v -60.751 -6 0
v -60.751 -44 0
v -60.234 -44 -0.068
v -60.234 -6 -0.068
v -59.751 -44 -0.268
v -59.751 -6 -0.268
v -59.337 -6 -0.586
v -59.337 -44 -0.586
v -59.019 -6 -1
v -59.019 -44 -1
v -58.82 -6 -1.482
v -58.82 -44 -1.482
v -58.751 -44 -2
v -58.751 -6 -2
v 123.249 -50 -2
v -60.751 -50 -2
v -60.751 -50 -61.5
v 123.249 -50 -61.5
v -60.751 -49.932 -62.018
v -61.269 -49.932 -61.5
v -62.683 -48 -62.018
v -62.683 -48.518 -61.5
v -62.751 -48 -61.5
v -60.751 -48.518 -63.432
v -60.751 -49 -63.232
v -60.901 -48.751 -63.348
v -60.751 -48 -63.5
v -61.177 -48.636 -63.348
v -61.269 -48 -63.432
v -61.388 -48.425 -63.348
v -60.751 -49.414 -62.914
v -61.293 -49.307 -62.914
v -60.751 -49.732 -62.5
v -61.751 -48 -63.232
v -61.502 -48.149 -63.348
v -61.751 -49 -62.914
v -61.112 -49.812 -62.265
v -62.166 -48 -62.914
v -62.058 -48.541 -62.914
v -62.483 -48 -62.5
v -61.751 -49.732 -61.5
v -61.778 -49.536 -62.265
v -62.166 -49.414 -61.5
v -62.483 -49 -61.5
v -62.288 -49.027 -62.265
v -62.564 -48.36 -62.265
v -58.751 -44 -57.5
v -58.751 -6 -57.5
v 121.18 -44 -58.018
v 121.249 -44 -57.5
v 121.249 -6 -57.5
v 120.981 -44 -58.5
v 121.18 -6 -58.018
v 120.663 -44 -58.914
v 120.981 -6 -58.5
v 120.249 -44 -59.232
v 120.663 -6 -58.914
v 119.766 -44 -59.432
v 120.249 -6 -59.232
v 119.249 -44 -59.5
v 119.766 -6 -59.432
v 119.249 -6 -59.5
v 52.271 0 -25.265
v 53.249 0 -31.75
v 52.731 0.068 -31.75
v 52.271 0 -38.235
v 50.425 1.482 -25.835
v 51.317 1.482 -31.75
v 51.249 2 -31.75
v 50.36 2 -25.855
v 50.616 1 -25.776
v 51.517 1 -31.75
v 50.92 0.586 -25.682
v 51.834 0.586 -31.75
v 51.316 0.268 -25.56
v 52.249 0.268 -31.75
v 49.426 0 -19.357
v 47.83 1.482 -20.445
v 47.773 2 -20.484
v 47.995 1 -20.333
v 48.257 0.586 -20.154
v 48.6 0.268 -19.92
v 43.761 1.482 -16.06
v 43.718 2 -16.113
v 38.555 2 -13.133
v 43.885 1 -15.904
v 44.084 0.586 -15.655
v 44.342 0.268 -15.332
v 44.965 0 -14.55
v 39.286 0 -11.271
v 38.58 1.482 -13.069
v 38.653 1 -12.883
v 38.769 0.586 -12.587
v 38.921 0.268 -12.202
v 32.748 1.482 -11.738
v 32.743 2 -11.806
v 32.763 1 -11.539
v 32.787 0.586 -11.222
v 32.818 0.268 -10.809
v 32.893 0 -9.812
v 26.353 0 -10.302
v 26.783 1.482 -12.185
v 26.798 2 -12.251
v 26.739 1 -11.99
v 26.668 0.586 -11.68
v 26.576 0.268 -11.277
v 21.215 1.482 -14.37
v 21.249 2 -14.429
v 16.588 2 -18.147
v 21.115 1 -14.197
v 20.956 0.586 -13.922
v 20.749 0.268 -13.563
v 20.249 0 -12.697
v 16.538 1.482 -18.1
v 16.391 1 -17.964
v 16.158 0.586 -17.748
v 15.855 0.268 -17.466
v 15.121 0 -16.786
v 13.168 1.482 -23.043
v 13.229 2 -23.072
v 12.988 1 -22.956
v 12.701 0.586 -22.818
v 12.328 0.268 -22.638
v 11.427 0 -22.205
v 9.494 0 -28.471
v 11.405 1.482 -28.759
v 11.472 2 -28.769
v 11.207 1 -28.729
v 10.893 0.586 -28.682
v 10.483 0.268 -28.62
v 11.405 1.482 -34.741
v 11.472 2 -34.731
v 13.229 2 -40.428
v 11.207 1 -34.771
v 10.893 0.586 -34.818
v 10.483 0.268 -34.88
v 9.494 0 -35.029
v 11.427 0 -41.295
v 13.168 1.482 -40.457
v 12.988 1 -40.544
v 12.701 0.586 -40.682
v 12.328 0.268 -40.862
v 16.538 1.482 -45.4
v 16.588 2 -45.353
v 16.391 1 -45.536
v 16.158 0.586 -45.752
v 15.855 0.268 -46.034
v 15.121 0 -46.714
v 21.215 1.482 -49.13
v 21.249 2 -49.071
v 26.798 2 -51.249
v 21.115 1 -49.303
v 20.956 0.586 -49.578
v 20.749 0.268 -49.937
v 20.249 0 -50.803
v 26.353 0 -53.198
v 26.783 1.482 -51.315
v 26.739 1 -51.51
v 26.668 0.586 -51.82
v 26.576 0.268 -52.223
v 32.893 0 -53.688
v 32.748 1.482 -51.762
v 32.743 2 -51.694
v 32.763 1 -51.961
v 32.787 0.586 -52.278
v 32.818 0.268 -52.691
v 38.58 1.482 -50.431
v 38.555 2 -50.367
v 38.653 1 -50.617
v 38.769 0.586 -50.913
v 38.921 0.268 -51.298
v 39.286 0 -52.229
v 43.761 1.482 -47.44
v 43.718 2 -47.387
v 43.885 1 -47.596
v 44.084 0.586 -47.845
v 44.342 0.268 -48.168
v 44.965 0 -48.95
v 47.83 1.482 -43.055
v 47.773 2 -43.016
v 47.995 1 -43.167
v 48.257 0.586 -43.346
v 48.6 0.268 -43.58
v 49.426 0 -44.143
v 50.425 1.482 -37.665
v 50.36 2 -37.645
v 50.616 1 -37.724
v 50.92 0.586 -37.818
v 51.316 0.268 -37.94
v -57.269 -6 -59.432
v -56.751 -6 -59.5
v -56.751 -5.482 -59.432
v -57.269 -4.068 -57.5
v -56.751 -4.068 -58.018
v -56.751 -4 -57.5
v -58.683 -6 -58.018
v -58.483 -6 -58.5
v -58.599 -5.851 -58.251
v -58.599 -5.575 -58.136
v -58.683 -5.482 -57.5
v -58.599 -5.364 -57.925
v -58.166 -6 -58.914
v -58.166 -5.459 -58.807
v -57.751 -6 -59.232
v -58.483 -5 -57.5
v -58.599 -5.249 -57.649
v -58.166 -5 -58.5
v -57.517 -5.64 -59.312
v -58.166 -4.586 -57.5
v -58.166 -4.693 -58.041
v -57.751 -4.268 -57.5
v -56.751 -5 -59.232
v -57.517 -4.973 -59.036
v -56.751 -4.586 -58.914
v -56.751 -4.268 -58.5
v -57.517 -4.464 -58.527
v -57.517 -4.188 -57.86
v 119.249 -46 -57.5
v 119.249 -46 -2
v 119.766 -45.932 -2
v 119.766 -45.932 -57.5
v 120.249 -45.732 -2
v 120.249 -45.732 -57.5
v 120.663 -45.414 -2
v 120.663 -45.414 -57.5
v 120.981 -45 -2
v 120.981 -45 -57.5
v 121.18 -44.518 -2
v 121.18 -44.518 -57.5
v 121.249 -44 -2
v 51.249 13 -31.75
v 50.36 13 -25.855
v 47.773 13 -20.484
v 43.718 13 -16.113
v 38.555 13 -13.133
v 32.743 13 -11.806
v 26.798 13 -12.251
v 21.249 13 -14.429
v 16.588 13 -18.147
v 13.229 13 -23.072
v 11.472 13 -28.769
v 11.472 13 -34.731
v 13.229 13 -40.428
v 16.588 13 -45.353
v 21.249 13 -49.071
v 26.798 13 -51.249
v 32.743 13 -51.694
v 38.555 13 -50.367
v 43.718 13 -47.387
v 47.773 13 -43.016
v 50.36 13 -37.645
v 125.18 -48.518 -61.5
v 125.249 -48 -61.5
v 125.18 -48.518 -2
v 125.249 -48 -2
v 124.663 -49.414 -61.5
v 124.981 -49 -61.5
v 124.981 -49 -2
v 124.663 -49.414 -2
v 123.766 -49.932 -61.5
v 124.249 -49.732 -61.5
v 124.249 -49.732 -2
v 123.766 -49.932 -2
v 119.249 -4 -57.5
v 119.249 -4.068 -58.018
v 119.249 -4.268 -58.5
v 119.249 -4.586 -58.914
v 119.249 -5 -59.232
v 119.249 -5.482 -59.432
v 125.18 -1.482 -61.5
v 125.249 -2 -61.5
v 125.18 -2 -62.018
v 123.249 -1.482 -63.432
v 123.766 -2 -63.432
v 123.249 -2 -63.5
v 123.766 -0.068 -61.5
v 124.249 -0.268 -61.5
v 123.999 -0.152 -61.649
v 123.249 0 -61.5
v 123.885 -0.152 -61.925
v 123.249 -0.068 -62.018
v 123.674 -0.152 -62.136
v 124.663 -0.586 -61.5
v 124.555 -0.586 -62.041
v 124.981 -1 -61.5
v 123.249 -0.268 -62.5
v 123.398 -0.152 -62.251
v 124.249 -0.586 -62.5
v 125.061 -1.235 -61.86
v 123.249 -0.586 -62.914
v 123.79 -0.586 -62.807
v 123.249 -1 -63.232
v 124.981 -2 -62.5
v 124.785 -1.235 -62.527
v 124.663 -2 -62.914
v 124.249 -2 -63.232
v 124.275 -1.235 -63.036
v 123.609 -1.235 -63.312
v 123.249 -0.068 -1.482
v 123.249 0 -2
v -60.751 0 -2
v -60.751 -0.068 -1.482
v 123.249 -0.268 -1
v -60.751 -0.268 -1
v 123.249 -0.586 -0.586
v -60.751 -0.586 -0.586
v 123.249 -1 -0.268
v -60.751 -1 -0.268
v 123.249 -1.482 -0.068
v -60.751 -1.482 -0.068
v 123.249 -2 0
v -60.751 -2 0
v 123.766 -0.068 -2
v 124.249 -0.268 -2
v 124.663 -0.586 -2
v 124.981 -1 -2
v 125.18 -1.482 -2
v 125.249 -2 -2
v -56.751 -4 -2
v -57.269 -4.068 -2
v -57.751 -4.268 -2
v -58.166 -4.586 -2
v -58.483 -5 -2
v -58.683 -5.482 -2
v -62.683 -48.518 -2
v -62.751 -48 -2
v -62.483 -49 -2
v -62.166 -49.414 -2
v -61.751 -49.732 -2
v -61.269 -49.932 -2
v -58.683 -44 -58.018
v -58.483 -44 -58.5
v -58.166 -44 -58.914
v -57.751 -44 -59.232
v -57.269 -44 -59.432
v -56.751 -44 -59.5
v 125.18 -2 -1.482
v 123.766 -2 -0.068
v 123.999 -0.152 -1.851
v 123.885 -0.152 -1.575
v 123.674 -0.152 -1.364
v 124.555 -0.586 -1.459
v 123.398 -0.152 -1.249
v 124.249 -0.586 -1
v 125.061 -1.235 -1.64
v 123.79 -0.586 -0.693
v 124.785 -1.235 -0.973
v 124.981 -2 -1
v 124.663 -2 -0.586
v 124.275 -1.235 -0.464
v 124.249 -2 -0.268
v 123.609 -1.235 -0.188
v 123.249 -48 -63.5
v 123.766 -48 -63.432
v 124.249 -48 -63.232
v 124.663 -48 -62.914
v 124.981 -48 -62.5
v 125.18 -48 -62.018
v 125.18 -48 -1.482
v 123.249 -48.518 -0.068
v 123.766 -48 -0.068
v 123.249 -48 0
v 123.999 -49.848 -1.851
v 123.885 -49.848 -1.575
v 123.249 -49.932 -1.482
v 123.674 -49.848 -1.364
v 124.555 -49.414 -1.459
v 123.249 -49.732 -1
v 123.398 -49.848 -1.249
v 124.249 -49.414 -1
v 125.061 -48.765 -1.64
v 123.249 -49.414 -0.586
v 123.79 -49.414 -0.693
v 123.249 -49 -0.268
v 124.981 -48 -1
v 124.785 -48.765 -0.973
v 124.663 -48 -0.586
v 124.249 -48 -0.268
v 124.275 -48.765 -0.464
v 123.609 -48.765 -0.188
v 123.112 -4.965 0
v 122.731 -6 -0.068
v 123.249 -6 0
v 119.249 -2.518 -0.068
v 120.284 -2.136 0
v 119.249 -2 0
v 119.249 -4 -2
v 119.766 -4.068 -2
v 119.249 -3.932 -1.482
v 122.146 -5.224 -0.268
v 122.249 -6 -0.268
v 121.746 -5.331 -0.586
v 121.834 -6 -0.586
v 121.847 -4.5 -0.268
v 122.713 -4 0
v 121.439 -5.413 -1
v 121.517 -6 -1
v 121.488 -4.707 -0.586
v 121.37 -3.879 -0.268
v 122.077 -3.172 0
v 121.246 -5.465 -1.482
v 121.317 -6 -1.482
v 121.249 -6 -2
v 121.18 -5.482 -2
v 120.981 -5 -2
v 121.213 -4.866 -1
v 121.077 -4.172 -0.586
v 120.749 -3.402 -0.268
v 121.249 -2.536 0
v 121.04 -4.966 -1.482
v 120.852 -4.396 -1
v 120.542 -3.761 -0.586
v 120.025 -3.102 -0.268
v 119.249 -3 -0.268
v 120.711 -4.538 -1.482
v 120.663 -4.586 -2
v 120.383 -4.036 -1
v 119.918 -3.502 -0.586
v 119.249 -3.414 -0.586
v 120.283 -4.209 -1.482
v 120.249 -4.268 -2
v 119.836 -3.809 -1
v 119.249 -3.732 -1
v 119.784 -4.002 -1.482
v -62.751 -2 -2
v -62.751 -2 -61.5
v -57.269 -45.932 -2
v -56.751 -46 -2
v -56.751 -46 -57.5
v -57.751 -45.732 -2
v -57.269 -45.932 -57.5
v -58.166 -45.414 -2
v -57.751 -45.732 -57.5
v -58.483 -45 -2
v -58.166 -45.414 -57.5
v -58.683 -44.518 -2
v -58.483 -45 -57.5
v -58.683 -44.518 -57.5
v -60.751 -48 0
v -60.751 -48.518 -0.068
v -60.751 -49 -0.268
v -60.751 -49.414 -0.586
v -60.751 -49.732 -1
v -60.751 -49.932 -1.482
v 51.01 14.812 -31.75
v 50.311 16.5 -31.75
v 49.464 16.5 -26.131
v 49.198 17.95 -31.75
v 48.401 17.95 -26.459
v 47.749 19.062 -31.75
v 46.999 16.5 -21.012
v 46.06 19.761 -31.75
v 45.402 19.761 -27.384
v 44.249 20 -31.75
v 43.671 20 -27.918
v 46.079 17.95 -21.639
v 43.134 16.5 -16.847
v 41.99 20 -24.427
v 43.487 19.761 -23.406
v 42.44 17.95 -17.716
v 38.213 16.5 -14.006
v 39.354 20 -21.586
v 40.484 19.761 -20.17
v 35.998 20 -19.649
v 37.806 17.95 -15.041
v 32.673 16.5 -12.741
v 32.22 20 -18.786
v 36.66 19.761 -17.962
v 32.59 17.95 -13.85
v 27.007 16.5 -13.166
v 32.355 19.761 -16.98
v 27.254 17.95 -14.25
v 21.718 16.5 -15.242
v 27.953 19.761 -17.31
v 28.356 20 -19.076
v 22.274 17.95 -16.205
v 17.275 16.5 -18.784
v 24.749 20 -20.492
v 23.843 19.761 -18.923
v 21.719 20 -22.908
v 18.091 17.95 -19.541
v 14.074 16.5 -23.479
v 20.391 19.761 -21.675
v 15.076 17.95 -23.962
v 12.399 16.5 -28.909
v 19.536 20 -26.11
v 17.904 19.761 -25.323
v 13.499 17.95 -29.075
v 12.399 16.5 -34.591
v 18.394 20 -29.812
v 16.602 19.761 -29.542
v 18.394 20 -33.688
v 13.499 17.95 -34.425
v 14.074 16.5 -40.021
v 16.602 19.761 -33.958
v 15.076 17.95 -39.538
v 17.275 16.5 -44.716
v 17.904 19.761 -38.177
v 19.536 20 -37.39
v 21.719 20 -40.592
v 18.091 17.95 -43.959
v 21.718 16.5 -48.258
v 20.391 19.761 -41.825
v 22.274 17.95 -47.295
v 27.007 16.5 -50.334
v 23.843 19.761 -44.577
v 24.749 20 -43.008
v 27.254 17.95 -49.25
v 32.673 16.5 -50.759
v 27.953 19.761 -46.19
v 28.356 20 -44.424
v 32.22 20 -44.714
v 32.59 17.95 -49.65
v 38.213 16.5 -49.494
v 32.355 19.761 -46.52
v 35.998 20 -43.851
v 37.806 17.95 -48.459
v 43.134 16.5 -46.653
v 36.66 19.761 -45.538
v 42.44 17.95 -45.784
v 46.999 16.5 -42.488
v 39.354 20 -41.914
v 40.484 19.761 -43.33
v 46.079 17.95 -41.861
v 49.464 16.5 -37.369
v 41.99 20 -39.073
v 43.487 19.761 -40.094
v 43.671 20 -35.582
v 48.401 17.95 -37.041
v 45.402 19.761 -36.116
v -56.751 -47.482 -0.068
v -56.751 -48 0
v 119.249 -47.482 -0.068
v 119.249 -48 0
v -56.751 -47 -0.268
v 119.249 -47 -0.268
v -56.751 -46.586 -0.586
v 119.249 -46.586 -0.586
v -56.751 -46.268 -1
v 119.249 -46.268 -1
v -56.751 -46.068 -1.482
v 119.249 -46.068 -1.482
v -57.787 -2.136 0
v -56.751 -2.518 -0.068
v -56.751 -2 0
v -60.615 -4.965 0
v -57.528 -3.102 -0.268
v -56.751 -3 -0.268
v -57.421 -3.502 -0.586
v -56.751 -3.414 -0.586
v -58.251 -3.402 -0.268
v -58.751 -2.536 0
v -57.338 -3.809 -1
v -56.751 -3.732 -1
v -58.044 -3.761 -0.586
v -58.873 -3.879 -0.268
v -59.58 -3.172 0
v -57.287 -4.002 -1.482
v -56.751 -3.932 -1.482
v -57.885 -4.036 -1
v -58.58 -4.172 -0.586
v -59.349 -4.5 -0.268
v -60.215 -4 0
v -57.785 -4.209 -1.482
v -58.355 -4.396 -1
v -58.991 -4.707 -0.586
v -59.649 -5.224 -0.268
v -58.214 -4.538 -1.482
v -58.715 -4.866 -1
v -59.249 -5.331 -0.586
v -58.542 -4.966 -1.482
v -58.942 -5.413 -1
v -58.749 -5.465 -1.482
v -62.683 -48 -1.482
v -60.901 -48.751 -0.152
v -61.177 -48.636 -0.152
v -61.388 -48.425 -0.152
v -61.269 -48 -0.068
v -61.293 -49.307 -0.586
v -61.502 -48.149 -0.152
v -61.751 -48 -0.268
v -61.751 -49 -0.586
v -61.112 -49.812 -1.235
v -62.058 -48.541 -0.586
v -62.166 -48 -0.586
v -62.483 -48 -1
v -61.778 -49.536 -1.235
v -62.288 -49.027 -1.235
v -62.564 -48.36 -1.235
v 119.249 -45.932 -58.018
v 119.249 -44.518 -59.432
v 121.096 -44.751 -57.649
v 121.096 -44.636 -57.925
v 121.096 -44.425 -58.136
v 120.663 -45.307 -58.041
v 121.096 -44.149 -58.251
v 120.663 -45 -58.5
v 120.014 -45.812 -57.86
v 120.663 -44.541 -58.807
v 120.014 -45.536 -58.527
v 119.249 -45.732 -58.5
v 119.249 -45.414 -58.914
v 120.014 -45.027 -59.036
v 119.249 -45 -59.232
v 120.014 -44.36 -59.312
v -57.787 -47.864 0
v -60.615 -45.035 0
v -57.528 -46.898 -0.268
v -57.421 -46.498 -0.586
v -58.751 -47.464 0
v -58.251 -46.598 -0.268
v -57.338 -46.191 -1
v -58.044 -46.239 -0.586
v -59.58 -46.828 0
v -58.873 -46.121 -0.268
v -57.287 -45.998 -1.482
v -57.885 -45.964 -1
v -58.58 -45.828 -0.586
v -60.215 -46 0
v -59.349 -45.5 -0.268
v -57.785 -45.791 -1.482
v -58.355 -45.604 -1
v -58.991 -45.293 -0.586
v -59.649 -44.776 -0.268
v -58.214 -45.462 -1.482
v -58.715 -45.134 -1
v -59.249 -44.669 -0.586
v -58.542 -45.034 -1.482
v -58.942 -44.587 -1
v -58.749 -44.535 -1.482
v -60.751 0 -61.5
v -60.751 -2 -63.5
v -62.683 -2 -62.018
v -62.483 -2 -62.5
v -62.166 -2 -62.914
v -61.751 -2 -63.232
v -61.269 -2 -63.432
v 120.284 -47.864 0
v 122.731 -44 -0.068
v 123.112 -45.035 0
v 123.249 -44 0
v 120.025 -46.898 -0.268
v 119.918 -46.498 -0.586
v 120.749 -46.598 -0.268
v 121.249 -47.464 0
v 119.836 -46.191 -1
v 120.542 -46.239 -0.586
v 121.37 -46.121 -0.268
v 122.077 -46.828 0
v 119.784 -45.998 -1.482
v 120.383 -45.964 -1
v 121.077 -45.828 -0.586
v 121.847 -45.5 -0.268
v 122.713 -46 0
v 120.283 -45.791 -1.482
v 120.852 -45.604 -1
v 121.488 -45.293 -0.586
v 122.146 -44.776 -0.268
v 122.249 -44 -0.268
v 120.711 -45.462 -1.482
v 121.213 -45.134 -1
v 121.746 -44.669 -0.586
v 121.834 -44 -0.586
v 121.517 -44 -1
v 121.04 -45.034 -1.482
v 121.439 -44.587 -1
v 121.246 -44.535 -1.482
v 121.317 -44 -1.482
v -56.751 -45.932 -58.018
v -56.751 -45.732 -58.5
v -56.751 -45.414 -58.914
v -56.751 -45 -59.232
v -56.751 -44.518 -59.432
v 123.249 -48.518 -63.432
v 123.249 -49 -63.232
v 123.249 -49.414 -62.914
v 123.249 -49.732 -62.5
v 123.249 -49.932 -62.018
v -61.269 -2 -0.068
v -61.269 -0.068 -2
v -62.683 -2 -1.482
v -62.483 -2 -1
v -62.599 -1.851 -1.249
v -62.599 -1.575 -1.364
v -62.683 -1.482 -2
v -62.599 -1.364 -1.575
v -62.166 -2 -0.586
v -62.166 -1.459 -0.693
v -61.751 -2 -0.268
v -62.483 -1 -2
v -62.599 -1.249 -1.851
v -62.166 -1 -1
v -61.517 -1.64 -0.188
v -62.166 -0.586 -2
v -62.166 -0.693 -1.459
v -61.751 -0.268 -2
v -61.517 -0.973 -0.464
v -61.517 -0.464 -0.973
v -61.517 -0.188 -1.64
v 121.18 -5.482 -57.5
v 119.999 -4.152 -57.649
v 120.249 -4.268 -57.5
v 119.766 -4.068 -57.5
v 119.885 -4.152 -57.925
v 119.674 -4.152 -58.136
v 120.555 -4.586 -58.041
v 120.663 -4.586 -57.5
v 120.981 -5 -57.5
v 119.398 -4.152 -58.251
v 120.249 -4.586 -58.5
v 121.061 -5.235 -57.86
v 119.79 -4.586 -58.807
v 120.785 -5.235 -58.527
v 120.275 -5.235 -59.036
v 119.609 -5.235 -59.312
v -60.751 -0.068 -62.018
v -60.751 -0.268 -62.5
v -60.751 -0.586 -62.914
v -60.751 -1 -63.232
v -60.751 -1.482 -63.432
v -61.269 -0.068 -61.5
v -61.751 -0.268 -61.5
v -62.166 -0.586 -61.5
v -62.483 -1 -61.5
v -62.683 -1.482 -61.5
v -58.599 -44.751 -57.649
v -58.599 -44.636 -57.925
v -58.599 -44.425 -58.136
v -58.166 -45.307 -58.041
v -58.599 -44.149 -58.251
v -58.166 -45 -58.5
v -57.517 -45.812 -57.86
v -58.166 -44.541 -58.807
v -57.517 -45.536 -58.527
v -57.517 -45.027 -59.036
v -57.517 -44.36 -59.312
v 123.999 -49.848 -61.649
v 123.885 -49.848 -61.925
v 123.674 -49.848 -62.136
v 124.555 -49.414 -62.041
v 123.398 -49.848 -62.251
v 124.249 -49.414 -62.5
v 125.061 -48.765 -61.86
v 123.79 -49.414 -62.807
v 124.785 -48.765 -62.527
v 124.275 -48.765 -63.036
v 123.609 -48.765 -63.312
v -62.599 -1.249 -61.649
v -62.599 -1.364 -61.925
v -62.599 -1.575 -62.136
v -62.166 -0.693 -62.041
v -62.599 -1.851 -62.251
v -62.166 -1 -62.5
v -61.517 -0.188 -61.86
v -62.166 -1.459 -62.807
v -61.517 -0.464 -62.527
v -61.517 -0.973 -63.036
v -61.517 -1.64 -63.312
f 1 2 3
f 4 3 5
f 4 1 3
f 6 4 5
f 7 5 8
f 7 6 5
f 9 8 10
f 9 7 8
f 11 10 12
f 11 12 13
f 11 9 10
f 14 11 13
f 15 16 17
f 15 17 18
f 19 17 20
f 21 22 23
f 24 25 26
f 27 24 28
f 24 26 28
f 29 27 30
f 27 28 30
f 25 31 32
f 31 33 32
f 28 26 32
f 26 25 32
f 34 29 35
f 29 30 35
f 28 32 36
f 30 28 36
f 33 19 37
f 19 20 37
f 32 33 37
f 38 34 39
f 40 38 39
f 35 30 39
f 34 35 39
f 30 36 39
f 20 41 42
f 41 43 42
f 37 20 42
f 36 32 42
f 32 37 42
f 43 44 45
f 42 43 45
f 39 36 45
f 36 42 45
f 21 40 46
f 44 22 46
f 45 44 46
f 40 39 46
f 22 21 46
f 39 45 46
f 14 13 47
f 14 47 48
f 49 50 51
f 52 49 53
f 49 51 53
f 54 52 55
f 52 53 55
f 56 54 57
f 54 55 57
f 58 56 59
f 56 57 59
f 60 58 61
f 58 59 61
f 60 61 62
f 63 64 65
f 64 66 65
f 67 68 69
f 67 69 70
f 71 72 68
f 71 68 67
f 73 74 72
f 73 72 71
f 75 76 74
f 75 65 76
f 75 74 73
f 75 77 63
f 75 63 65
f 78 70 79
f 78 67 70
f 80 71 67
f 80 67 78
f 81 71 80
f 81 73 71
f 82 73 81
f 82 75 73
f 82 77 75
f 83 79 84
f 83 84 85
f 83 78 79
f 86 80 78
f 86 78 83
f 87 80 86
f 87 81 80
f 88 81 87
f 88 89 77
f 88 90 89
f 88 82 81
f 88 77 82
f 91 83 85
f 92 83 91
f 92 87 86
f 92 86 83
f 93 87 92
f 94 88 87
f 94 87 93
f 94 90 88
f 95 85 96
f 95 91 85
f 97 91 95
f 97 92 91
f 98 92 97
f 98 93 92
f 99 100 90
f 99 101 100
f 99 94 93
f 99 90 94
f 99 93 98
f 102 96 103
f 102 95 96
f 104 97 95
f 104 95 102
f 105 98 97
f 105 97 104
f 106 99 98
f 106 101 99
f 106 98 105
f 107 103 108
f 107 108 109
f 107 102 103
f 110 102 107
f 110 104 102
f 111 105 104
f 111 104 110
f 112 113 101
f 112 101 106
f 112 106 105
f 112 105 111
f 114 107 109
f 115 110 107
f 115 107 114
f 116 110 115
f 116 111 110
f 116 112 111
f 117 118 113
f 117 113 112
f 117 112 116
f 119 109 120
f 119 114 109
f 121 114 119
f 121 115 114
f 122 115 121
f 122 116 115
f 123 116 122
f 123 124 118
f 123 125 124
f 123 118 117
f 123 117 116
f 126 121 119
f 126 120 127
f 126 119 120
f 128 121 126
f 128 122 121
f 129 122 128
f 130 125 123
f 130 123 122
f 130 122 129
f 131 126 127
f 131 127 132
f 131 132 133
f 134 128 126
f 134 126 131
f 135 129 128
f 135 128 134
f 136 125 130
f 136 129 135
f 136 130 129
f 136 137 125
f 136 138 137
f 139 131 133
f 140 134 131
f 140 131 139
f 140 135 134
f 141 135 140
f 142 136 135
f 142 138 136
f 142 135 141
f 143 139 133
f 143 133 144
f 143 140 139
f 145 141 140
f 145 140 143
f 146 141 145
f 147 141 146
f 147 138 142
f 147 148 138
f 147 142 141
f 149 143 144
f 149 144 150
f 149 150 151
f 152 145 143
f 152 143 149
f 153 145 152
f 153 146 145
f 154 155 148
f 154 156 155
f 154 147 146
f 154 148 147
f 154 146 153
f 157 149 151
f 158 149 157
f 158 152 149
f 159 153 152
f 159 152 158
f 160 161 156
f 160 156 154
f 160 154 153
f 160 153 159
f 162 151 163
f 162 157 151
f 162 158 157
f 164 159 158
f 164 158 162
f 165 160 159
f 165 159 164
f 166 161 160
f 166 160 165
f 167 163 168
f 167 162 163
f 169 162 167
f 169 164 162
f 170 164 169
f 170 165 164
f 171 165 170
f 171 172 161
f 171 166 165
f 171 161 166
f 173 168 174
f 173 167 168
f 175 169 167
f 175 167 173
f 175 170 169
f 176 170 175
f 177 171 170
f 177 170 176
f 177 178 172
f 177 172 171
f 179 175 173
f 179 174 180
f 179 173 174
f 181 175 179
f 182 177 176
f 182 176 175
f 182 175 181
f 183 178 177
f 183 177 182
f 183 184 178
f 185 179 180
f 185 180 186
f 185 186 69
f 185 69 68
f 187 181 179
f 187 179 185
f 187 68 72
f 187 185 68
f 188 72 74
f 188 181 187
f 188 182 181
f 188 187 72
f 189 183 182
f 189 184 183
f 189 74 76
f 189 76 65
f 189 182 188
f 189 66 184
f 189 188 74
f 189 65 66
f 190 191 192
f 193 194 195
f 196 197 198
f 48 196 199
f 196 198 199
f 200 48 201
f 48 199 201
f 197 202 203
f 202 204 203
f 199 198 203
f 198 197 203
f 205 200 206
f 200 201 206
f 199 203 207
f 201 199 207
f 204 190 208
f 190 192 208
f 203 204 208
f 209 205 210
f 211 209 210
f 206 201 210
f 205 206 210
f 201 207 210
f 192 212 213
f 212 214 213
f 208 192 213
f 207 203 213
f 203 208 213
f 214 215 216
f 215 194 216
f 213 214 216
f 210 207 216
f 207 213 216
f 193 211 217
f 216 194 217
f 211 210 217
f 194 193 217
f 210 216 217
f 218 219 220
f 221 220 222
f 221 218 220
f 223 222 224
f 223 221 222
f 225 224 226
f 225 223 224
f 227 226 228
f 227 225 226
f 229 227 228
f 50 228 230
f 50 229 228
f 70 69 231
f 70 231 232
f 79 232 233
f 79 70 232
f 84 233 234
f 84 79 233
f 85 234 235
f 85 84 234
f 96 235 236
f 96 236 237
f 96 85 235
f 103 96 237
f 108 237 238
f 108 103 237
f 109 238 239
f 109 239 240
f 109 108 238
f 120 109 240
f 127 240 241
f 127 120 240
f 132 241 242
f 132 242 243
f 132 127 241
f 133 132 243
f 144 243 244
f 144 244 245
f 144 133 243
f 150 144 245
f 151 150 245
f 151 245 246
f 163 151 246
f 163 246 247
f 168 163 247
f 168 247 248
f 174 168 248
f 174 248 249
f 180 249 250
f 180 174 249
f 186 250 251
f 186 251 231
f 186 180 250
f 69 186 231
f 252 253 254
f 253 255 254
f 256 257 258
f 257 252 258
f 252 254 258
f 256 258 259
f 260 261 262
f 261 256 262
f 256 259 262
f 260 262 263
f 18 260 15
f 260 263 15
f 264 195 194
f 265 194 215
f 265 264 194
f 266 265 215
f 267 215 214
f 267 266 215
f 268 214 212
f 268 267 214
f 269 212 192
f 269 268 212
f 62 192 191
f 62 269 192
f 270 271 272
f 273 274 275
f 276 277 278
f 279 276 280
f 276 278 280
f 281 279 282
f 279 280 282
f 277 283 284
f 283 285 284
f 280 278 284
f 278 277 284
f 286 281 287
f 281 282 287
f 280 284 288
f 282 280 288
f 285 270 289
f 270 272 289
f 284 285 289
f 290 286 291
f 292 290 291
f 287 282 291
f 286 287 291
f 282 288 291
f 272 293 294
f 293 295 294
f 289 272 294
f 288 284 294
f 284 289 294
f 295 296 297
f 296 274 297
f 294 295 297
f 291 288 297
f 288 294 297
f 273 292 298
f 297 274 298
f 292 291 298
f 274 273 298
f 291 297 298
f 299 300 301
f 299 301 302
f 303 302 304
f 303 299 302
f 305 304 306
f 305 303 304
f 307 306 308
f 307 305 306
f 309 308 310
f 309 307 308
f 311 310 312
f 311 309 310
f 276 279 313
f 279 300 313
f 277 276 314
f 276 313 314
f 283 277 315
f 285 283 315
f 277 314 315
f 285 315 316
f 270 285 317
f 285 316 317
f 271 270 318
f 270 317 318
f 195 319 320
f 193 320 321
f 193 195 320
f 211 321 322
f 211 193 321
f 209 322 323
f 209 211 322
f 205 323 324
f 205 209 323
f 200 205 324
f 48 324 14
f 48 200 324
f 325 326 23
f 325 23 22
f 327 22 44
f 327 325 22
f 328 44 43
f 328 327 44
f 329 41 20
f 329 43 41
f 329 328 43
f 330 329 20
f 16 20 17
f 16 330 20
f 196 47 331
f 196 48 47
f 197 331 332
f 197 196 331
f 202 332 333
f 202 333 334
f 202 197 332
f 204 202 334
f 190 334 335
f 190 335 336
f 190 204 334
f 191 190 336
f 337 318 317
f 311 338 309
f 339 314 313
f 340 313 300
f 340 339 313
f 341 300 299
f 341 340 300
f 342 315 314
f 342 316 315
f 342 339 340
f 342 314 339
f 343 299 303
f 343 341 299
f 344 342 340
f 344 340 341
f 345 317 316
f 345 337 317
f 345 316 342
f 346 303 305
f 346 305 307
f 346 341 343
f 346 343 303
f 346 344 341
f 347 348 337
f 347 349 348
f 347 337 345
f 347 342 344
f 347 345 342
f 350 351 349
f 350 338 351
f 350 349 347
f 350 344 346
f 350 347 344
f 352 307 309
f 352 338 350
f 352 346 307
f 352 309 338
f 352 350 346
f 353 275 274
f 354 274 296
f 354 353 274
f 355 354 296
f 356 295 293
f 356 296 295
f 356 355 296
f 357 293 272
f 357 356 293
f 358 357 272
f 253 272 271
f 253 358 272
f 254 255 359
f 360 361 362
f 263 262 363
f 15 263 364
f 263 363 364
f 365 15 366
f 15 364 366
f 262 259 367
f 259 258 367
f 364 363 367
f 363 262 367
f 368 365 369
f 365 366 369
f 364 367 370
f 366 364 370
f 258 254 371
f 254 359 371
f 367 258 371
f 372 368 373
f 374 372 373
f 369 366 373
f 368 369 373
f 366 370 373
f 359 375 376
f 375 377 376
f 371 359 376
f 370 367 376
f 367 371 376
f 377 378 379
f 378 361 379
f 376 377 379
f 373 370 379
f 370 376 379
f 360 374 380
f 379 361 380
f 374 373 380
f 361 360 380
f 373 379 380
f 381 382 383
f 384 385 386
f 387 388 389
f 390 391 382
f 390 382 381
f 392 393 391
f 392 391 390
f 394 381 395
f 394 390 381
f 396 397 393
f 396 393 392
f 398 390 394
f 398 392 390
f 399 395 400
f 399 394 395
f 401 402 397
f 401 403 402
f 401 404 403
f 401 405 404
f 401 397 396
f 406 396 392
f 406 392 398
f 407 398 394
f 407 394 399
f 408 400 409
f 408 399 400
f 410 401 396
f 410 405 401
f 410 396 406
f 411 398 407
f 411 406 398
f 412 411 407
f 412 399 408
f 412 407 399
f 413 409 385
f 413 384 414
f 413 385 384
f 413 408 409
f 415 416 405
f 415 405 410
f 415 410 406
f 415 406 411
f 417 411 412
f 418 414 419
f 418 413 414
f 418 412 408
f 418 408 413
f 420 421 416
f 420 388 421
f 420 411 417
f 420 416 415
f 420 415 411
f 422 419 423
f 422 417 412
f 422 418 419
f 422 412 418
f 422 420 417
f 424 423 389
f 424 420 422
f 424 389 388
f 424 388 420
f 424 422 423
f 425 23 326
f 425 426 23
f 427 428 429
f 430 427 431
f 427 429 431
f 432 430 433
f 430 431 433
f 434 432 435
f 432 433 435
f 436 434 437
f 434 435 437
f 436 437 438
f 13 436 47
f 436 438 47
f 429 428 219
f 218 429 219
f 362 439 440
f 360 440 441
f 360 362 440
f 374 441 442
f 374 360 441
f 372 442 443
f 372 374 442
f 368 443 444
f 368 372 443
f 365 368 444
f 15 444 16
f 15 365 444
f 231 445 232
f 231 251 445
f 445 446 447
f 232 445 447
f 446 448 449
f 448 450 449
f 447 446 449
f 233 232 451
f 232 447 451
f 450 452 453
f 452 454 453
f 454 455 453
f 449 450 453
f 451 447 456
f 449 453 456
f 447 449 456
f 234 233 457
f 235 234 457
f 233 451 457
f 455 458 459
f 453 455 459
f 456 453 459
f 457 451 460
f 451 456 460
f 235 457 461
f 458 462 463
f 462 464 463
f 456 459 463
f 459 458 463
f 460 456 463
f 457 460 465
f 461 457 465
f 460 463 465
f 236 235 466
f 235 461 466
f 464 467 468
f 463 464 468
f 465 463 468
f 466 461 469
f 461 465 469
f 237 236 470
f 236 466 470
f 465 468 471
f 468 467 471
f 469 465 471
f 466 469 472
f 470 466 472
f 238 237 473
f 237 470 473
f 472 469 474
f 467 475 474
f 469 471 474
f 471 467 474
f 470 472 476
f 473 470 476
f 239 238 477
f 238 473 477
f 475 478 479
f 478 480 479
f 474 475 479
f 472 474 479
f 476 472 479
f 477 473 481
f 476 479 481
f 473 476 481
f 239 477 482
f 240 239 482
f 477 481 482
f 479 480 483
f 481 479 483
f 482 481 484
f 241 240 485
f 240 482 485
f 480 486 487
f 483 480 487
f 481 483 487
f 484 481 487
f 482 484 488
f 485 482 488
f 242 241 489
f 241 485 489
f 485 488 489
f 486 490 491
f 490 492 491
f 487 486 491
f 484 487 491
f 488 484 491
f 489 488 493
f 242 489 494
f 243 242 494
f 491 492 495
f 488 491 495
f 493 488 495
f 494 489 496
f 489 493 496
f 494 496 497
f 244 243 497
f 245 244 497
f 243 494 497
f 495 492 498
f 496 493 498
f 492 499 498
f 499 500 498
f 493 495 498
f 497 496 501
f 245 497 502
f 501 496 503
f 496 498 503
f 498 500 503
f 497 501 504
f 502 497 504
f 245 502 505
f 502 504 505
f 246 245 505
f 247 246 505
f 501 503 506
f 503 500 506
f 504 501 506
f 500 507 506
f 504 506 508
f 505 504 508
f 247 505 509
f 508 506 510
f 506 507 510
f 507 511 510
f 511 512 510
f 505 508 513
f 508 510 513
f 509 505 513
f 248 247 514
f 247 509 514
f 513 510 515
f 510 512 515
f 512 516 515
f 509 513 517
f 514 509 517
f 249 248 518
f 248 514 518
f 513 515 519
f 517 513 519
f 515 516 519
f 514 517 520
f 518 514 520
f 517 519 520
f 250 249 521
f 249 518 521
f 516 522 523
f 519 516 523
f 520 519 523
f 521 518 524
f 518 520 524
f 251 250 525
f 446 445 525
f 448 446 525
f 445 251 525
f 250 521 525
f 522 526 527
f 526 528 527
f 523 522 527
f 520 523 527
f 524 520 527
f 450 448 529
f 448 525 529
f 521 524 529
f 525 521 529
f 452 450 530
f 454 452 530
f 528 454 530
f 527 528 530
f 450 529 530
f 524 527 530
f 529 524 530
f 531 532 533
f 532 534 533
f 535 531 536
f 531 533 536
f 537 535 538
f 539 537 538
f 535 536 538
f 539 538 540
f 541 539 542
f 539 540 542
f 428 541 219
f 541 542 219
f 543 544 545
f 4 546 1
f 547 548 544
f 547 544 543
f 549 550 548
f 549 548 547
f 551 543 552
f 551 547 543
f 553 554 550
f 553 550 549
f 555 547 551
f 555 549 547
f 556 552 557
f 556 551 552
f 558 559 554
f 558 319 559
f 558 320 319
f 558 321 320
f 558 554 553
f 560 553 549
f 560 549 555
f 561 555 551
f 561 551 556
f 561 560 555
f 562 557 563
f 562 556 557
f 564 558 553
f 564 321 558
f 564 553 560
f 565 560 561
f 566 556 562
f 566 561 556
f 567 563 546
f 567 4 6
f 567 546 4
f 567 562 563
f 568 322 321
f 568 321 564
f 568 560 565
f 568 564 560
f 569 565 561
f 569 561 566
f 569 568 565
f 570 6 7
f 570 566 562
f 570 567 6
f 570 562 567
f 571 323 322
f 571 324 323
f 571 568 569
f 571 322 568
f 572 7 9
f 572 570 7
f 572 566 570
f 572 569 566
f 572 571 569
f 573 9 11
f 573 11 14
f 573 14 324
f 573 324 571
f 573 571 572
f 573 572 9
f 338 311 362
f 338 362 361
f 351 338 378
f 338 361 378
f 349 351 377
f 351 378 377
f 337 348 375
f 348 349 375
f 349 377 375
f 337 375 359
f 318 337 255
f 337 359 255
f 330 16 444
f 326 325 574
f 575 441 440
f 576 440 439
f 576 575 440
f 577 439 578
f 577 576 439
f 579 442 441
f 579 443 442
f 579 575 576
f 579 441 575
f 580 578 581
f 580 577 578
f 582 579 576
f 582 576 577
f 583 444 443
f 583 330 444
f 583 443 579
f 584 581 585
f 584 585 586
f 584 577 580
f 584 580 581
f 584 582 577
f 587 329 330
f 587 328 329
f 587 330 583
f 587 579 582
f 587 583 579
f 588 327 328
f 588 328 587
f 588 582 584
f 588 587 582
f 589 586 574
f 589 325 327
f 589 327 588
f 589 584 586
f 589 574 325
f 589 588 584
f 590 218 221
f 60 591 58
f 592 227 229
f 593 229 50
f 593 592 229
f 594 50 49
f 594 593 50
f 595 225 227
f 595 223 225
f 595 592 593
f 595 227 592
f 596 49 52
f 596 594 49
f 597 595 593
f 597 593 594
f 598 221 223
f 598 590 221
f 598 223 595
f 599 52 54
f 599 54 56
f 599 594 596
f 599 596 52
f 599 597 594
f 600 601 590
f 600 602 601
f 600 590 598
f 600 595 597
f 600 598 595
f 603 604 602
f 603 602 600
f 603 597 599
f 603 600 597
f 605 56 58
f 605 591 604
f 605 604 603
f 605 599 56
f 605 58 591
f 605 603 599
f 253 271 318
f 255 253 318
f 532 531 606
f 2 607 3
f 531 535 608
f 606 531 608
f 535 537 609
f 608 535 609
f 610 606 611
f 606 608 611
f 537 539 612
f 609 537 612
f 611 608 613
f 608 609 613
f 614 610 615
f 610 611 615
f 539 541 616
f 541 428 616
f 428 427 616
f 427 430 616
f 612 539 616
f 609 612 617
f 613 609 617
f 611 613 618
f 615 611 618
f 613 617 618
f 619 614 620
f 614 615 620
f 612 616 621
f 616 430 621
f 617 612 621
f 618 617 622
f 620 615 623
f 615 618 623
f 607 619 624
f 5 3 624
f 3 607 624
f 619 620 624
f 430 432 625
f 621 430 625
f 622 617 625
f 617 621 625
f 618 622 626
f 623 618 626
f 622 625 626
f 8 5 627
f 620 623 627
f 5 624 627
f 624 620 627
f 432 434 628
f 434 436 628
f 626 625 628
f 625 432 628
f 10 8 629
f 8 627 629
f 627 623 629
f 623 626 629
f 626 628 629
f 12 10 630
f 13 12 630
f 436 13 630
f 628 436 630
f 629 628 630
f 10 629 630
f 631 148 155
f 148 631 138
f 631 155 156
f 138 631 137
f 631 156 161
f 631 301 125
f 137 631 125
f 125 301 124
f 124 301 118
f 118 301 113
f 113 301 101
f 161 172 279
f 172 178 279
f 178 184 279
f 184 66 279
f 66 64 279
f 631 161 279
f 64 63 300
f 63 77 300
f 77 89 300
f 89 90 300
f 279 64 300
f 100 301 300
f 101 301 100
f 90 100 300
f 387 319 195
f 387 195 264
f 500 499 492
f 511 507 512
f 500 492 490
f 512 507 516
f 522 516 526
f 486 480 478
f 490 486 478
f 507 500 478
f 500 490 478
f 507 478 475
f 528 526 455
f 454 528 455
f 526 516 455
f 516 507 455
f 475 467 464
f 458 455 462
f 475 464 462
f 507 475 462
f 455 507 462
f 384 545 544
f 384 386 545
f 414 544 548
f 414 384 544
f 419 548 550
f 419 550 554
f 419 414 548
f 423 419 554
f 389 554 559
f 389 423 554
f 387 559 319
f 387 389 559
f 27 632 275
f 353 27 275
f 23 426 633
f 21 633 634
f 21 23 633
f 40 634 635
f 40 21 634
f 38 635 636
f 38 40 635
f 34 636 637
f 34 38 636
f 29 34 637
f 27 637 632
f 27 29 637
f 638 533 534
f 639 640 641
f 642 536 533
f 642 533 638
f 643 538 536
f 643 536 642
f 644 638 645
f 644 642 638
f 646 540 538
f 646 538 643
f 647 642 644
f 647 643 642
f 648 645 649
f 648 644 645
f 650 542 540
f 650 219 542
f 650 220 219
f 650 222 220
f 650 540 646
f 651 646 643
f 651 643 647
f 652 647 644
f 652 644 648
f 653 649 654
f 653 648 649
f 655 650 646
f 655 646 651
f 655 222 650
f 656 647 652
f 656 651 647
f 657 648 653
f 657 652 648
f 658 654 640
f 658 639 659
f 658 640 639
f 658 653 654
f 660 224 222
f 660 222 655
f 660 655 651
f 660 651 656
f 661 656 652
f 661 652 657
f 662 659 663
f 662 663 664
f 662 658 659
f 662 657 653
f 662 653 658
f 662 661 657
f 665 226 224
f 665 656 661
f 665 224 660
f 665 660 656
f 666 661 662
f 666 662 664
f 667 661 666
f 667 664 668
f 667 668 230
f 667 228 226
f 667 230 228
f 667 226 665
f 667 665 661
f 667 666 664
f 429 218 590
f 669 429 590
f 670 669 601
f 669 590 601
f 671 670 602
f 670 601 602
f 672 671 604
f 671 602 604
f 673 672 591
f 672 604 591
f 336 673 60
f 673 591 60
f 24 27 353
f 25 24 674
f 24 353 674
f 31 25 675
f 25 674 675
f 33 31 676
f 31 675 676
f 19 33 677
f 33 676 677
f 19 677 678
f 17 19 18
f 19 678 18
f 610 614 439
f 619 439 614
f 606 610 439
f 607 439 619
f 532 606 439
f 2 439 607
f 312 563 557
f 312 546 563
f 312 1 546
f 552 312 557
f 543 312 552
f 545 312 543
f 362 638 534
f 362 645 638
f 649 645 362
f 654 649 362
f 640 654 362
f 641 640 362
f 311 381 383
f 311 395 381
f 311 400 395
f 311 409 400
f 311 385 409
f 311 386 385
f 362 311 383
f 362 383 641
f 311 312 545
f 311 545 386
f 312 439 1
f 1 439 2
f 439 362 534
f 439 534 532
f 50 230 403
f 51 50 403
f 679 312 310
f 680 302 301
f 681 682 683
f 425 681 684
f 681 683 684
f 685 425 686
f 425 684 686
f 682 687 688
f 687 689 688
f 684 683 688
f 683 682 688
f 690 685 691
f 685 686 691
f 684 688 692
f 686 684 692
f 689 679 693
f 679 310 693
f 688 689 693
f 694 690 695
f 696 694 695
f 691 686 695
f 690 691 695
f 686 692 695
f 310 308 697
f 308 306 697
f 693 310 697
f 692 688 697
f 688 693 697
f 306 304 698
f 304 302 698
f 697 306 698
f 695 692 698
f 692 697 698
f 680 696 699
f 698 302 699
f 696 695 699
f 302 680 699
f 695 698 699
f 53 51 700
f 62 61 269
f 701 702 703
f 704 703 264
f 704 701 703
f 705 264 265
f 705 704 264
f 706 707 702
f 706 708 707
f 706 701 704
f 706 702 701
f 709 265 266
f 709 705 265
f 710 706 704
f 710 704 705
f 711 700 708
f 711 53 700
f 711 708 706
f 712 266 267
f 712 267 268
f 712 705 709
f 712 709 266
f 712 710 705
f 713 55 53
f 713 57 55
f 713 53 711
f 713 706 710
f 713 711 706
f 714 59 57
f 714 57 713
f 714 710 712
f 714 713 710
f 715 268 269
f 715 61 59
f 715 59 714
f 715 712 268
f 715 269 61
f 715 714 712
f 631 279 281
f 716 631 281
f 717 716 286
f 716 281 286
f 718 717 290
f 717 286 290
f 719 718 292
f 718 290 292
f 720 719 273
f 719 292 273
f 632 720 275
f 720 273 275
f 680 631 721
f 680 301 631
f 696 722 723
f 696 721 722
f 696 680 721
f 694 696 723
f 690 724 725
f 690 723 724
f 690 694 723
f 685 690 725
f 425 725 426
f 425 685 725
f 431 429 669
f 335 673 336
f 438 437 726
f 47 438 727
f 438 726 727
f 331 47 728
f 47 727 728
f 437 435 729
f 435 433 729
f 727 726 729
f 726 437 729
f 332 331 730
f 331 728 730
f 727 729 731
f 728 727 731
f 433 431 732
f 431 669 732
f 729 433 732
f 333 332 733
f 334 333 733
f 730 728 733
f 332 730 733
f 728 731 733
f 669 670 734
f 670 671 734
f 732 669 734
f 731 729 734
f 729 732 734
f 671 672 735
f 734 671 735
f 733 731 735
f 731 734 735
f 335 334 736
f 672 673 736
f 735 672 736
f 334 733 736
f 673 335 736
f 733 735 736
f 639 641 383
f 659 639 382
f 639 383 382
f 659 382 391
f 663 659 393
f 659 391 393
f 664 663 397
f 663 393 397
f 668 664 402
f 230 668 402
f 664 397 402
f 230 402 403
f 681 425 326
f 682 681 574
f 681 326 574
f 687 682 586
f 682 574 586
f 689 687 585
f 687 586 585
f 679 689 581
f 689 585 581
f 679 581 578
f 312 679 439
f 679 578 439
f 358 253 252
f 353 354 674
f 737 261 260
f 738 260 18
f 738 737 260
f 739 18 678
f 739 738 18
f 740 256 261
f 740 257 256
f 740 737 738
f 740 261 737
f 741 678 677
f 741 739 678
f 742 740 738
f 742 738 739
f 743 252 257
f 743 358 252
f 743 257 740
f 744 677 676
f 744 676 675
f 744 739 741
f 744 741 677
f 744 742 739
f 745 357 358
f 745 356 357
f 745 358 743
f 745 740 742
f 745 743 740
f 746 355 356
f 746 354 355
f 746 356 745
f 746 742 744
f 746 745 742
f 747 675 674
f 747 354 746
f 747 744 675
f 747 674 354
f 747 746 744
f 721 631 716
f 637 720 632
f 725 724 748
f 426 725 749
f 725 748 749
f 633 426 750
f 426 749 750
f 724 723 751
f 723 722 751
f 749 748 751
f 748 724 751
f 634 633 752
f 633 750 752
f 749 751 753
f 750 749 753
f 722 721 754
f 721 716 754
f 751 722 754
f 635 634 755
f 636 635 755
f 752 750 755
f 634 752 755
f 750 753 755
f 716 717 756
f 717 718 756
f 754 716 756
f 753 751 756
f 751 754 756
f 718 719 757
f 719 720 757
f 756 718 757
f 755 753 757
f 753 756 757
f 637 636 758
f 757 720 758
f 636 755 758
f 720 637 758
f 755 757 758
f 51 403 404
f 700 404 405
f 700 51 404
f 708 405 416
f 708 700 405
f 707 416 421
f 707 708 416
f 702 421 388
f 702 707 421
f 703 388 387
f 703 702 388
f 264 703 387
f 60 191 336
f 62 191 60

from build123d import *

# Parameters (mm, degrees)
F0_W     = 188
F0_H     = 63.5
F1_DEPTH = 50
F2_W     = 180
F2_H     = 42
F3_DEPTH = 59.5
F4_R     = 20
F5_DEPTH = 20
F6_R     = 7
F7_R     = 1.99999


# Not quite as in the source:
# - a fillet or chamfer is up to 0.001 mm smaller than in the source, because OpenCascade refuses the exact size


with BuildPart() as f1:
    # F0 (on Front) → F1 (new body)
    with BuildSketch(Plane.XZ):
        with Locations((31.2486086041, -31.75)):
            Rectangle(F0_W, F0_H)
    extrude(amount=F1_DEPTH)

    # F2 (on Top) → F3 (cut)
    with BuildSketch(Plane.XY):
        with Locations((31.2486086041, -25)):
            Rectangle(F2_W, F2_H)
    extrude(amount=-F3_DEPTH, mode=Mode.SUBTRACT)

    # F4 (on Front) → F5 (join)
    with BuildSketch(Plane.XZ):
        with Locations((31.2486086041, -31.75)):
            Circle(F4_R)
    extrude(amount=-F5_DEPTH)

    # F6
    f6_edges = [f1.edges().sort_by_distance(p)[0] for p in [
        (11.248609, 20, -31.75),
    ]]
    fillet(f6_edges, radius=F6_R)

    # F7 (radius 2 in the source; OpenCascade refuses exactly that, so slightly less here)
    f7_edges = [f1.edges().sort_by_distance(p)[0] for p in [
        (125.248609, -25, 0),
        (125.248609, -25, -63.5),
        (125.248609, 0, -31.75),
        (125.248609, -50, -31.75),
        (31.248609, 0, 0),
        (-62.751391, -50, -31.75),
        (31.248609, -50, 0),
        (-62.751391, -25, 0),
        (31.248609, -46, 0),
        (121.248609, -25, 0),
        (31.248609, -46, -59.5),
        (31.248609, 0, -63.5),
        (121.248609, -46, -29.75),
        (121.248609, -25, -59.5),
        (31.248609, -4, 0),
        (-58.751391, -25, 0),
        (121.248609, -4, -29.75),
        (31.248609, -4, -59.5),
        (31.248609, -50, -63.5),
        (-58.751391, -46, -29.75),
        (18.248609, 20, -31.75),
        (11.248609, 0, -31.75),
        (11.248609, 13, -31.75),
        (-62.751391, 0, -31.75),
        (-58.751391, -25, -59.5),
        (-58.751391, -4, -29.75),
        (-62.751391, -25, -63.5),
    ]]
    fillet(f7_edges, radius=F7_R)


solid = f1.part
